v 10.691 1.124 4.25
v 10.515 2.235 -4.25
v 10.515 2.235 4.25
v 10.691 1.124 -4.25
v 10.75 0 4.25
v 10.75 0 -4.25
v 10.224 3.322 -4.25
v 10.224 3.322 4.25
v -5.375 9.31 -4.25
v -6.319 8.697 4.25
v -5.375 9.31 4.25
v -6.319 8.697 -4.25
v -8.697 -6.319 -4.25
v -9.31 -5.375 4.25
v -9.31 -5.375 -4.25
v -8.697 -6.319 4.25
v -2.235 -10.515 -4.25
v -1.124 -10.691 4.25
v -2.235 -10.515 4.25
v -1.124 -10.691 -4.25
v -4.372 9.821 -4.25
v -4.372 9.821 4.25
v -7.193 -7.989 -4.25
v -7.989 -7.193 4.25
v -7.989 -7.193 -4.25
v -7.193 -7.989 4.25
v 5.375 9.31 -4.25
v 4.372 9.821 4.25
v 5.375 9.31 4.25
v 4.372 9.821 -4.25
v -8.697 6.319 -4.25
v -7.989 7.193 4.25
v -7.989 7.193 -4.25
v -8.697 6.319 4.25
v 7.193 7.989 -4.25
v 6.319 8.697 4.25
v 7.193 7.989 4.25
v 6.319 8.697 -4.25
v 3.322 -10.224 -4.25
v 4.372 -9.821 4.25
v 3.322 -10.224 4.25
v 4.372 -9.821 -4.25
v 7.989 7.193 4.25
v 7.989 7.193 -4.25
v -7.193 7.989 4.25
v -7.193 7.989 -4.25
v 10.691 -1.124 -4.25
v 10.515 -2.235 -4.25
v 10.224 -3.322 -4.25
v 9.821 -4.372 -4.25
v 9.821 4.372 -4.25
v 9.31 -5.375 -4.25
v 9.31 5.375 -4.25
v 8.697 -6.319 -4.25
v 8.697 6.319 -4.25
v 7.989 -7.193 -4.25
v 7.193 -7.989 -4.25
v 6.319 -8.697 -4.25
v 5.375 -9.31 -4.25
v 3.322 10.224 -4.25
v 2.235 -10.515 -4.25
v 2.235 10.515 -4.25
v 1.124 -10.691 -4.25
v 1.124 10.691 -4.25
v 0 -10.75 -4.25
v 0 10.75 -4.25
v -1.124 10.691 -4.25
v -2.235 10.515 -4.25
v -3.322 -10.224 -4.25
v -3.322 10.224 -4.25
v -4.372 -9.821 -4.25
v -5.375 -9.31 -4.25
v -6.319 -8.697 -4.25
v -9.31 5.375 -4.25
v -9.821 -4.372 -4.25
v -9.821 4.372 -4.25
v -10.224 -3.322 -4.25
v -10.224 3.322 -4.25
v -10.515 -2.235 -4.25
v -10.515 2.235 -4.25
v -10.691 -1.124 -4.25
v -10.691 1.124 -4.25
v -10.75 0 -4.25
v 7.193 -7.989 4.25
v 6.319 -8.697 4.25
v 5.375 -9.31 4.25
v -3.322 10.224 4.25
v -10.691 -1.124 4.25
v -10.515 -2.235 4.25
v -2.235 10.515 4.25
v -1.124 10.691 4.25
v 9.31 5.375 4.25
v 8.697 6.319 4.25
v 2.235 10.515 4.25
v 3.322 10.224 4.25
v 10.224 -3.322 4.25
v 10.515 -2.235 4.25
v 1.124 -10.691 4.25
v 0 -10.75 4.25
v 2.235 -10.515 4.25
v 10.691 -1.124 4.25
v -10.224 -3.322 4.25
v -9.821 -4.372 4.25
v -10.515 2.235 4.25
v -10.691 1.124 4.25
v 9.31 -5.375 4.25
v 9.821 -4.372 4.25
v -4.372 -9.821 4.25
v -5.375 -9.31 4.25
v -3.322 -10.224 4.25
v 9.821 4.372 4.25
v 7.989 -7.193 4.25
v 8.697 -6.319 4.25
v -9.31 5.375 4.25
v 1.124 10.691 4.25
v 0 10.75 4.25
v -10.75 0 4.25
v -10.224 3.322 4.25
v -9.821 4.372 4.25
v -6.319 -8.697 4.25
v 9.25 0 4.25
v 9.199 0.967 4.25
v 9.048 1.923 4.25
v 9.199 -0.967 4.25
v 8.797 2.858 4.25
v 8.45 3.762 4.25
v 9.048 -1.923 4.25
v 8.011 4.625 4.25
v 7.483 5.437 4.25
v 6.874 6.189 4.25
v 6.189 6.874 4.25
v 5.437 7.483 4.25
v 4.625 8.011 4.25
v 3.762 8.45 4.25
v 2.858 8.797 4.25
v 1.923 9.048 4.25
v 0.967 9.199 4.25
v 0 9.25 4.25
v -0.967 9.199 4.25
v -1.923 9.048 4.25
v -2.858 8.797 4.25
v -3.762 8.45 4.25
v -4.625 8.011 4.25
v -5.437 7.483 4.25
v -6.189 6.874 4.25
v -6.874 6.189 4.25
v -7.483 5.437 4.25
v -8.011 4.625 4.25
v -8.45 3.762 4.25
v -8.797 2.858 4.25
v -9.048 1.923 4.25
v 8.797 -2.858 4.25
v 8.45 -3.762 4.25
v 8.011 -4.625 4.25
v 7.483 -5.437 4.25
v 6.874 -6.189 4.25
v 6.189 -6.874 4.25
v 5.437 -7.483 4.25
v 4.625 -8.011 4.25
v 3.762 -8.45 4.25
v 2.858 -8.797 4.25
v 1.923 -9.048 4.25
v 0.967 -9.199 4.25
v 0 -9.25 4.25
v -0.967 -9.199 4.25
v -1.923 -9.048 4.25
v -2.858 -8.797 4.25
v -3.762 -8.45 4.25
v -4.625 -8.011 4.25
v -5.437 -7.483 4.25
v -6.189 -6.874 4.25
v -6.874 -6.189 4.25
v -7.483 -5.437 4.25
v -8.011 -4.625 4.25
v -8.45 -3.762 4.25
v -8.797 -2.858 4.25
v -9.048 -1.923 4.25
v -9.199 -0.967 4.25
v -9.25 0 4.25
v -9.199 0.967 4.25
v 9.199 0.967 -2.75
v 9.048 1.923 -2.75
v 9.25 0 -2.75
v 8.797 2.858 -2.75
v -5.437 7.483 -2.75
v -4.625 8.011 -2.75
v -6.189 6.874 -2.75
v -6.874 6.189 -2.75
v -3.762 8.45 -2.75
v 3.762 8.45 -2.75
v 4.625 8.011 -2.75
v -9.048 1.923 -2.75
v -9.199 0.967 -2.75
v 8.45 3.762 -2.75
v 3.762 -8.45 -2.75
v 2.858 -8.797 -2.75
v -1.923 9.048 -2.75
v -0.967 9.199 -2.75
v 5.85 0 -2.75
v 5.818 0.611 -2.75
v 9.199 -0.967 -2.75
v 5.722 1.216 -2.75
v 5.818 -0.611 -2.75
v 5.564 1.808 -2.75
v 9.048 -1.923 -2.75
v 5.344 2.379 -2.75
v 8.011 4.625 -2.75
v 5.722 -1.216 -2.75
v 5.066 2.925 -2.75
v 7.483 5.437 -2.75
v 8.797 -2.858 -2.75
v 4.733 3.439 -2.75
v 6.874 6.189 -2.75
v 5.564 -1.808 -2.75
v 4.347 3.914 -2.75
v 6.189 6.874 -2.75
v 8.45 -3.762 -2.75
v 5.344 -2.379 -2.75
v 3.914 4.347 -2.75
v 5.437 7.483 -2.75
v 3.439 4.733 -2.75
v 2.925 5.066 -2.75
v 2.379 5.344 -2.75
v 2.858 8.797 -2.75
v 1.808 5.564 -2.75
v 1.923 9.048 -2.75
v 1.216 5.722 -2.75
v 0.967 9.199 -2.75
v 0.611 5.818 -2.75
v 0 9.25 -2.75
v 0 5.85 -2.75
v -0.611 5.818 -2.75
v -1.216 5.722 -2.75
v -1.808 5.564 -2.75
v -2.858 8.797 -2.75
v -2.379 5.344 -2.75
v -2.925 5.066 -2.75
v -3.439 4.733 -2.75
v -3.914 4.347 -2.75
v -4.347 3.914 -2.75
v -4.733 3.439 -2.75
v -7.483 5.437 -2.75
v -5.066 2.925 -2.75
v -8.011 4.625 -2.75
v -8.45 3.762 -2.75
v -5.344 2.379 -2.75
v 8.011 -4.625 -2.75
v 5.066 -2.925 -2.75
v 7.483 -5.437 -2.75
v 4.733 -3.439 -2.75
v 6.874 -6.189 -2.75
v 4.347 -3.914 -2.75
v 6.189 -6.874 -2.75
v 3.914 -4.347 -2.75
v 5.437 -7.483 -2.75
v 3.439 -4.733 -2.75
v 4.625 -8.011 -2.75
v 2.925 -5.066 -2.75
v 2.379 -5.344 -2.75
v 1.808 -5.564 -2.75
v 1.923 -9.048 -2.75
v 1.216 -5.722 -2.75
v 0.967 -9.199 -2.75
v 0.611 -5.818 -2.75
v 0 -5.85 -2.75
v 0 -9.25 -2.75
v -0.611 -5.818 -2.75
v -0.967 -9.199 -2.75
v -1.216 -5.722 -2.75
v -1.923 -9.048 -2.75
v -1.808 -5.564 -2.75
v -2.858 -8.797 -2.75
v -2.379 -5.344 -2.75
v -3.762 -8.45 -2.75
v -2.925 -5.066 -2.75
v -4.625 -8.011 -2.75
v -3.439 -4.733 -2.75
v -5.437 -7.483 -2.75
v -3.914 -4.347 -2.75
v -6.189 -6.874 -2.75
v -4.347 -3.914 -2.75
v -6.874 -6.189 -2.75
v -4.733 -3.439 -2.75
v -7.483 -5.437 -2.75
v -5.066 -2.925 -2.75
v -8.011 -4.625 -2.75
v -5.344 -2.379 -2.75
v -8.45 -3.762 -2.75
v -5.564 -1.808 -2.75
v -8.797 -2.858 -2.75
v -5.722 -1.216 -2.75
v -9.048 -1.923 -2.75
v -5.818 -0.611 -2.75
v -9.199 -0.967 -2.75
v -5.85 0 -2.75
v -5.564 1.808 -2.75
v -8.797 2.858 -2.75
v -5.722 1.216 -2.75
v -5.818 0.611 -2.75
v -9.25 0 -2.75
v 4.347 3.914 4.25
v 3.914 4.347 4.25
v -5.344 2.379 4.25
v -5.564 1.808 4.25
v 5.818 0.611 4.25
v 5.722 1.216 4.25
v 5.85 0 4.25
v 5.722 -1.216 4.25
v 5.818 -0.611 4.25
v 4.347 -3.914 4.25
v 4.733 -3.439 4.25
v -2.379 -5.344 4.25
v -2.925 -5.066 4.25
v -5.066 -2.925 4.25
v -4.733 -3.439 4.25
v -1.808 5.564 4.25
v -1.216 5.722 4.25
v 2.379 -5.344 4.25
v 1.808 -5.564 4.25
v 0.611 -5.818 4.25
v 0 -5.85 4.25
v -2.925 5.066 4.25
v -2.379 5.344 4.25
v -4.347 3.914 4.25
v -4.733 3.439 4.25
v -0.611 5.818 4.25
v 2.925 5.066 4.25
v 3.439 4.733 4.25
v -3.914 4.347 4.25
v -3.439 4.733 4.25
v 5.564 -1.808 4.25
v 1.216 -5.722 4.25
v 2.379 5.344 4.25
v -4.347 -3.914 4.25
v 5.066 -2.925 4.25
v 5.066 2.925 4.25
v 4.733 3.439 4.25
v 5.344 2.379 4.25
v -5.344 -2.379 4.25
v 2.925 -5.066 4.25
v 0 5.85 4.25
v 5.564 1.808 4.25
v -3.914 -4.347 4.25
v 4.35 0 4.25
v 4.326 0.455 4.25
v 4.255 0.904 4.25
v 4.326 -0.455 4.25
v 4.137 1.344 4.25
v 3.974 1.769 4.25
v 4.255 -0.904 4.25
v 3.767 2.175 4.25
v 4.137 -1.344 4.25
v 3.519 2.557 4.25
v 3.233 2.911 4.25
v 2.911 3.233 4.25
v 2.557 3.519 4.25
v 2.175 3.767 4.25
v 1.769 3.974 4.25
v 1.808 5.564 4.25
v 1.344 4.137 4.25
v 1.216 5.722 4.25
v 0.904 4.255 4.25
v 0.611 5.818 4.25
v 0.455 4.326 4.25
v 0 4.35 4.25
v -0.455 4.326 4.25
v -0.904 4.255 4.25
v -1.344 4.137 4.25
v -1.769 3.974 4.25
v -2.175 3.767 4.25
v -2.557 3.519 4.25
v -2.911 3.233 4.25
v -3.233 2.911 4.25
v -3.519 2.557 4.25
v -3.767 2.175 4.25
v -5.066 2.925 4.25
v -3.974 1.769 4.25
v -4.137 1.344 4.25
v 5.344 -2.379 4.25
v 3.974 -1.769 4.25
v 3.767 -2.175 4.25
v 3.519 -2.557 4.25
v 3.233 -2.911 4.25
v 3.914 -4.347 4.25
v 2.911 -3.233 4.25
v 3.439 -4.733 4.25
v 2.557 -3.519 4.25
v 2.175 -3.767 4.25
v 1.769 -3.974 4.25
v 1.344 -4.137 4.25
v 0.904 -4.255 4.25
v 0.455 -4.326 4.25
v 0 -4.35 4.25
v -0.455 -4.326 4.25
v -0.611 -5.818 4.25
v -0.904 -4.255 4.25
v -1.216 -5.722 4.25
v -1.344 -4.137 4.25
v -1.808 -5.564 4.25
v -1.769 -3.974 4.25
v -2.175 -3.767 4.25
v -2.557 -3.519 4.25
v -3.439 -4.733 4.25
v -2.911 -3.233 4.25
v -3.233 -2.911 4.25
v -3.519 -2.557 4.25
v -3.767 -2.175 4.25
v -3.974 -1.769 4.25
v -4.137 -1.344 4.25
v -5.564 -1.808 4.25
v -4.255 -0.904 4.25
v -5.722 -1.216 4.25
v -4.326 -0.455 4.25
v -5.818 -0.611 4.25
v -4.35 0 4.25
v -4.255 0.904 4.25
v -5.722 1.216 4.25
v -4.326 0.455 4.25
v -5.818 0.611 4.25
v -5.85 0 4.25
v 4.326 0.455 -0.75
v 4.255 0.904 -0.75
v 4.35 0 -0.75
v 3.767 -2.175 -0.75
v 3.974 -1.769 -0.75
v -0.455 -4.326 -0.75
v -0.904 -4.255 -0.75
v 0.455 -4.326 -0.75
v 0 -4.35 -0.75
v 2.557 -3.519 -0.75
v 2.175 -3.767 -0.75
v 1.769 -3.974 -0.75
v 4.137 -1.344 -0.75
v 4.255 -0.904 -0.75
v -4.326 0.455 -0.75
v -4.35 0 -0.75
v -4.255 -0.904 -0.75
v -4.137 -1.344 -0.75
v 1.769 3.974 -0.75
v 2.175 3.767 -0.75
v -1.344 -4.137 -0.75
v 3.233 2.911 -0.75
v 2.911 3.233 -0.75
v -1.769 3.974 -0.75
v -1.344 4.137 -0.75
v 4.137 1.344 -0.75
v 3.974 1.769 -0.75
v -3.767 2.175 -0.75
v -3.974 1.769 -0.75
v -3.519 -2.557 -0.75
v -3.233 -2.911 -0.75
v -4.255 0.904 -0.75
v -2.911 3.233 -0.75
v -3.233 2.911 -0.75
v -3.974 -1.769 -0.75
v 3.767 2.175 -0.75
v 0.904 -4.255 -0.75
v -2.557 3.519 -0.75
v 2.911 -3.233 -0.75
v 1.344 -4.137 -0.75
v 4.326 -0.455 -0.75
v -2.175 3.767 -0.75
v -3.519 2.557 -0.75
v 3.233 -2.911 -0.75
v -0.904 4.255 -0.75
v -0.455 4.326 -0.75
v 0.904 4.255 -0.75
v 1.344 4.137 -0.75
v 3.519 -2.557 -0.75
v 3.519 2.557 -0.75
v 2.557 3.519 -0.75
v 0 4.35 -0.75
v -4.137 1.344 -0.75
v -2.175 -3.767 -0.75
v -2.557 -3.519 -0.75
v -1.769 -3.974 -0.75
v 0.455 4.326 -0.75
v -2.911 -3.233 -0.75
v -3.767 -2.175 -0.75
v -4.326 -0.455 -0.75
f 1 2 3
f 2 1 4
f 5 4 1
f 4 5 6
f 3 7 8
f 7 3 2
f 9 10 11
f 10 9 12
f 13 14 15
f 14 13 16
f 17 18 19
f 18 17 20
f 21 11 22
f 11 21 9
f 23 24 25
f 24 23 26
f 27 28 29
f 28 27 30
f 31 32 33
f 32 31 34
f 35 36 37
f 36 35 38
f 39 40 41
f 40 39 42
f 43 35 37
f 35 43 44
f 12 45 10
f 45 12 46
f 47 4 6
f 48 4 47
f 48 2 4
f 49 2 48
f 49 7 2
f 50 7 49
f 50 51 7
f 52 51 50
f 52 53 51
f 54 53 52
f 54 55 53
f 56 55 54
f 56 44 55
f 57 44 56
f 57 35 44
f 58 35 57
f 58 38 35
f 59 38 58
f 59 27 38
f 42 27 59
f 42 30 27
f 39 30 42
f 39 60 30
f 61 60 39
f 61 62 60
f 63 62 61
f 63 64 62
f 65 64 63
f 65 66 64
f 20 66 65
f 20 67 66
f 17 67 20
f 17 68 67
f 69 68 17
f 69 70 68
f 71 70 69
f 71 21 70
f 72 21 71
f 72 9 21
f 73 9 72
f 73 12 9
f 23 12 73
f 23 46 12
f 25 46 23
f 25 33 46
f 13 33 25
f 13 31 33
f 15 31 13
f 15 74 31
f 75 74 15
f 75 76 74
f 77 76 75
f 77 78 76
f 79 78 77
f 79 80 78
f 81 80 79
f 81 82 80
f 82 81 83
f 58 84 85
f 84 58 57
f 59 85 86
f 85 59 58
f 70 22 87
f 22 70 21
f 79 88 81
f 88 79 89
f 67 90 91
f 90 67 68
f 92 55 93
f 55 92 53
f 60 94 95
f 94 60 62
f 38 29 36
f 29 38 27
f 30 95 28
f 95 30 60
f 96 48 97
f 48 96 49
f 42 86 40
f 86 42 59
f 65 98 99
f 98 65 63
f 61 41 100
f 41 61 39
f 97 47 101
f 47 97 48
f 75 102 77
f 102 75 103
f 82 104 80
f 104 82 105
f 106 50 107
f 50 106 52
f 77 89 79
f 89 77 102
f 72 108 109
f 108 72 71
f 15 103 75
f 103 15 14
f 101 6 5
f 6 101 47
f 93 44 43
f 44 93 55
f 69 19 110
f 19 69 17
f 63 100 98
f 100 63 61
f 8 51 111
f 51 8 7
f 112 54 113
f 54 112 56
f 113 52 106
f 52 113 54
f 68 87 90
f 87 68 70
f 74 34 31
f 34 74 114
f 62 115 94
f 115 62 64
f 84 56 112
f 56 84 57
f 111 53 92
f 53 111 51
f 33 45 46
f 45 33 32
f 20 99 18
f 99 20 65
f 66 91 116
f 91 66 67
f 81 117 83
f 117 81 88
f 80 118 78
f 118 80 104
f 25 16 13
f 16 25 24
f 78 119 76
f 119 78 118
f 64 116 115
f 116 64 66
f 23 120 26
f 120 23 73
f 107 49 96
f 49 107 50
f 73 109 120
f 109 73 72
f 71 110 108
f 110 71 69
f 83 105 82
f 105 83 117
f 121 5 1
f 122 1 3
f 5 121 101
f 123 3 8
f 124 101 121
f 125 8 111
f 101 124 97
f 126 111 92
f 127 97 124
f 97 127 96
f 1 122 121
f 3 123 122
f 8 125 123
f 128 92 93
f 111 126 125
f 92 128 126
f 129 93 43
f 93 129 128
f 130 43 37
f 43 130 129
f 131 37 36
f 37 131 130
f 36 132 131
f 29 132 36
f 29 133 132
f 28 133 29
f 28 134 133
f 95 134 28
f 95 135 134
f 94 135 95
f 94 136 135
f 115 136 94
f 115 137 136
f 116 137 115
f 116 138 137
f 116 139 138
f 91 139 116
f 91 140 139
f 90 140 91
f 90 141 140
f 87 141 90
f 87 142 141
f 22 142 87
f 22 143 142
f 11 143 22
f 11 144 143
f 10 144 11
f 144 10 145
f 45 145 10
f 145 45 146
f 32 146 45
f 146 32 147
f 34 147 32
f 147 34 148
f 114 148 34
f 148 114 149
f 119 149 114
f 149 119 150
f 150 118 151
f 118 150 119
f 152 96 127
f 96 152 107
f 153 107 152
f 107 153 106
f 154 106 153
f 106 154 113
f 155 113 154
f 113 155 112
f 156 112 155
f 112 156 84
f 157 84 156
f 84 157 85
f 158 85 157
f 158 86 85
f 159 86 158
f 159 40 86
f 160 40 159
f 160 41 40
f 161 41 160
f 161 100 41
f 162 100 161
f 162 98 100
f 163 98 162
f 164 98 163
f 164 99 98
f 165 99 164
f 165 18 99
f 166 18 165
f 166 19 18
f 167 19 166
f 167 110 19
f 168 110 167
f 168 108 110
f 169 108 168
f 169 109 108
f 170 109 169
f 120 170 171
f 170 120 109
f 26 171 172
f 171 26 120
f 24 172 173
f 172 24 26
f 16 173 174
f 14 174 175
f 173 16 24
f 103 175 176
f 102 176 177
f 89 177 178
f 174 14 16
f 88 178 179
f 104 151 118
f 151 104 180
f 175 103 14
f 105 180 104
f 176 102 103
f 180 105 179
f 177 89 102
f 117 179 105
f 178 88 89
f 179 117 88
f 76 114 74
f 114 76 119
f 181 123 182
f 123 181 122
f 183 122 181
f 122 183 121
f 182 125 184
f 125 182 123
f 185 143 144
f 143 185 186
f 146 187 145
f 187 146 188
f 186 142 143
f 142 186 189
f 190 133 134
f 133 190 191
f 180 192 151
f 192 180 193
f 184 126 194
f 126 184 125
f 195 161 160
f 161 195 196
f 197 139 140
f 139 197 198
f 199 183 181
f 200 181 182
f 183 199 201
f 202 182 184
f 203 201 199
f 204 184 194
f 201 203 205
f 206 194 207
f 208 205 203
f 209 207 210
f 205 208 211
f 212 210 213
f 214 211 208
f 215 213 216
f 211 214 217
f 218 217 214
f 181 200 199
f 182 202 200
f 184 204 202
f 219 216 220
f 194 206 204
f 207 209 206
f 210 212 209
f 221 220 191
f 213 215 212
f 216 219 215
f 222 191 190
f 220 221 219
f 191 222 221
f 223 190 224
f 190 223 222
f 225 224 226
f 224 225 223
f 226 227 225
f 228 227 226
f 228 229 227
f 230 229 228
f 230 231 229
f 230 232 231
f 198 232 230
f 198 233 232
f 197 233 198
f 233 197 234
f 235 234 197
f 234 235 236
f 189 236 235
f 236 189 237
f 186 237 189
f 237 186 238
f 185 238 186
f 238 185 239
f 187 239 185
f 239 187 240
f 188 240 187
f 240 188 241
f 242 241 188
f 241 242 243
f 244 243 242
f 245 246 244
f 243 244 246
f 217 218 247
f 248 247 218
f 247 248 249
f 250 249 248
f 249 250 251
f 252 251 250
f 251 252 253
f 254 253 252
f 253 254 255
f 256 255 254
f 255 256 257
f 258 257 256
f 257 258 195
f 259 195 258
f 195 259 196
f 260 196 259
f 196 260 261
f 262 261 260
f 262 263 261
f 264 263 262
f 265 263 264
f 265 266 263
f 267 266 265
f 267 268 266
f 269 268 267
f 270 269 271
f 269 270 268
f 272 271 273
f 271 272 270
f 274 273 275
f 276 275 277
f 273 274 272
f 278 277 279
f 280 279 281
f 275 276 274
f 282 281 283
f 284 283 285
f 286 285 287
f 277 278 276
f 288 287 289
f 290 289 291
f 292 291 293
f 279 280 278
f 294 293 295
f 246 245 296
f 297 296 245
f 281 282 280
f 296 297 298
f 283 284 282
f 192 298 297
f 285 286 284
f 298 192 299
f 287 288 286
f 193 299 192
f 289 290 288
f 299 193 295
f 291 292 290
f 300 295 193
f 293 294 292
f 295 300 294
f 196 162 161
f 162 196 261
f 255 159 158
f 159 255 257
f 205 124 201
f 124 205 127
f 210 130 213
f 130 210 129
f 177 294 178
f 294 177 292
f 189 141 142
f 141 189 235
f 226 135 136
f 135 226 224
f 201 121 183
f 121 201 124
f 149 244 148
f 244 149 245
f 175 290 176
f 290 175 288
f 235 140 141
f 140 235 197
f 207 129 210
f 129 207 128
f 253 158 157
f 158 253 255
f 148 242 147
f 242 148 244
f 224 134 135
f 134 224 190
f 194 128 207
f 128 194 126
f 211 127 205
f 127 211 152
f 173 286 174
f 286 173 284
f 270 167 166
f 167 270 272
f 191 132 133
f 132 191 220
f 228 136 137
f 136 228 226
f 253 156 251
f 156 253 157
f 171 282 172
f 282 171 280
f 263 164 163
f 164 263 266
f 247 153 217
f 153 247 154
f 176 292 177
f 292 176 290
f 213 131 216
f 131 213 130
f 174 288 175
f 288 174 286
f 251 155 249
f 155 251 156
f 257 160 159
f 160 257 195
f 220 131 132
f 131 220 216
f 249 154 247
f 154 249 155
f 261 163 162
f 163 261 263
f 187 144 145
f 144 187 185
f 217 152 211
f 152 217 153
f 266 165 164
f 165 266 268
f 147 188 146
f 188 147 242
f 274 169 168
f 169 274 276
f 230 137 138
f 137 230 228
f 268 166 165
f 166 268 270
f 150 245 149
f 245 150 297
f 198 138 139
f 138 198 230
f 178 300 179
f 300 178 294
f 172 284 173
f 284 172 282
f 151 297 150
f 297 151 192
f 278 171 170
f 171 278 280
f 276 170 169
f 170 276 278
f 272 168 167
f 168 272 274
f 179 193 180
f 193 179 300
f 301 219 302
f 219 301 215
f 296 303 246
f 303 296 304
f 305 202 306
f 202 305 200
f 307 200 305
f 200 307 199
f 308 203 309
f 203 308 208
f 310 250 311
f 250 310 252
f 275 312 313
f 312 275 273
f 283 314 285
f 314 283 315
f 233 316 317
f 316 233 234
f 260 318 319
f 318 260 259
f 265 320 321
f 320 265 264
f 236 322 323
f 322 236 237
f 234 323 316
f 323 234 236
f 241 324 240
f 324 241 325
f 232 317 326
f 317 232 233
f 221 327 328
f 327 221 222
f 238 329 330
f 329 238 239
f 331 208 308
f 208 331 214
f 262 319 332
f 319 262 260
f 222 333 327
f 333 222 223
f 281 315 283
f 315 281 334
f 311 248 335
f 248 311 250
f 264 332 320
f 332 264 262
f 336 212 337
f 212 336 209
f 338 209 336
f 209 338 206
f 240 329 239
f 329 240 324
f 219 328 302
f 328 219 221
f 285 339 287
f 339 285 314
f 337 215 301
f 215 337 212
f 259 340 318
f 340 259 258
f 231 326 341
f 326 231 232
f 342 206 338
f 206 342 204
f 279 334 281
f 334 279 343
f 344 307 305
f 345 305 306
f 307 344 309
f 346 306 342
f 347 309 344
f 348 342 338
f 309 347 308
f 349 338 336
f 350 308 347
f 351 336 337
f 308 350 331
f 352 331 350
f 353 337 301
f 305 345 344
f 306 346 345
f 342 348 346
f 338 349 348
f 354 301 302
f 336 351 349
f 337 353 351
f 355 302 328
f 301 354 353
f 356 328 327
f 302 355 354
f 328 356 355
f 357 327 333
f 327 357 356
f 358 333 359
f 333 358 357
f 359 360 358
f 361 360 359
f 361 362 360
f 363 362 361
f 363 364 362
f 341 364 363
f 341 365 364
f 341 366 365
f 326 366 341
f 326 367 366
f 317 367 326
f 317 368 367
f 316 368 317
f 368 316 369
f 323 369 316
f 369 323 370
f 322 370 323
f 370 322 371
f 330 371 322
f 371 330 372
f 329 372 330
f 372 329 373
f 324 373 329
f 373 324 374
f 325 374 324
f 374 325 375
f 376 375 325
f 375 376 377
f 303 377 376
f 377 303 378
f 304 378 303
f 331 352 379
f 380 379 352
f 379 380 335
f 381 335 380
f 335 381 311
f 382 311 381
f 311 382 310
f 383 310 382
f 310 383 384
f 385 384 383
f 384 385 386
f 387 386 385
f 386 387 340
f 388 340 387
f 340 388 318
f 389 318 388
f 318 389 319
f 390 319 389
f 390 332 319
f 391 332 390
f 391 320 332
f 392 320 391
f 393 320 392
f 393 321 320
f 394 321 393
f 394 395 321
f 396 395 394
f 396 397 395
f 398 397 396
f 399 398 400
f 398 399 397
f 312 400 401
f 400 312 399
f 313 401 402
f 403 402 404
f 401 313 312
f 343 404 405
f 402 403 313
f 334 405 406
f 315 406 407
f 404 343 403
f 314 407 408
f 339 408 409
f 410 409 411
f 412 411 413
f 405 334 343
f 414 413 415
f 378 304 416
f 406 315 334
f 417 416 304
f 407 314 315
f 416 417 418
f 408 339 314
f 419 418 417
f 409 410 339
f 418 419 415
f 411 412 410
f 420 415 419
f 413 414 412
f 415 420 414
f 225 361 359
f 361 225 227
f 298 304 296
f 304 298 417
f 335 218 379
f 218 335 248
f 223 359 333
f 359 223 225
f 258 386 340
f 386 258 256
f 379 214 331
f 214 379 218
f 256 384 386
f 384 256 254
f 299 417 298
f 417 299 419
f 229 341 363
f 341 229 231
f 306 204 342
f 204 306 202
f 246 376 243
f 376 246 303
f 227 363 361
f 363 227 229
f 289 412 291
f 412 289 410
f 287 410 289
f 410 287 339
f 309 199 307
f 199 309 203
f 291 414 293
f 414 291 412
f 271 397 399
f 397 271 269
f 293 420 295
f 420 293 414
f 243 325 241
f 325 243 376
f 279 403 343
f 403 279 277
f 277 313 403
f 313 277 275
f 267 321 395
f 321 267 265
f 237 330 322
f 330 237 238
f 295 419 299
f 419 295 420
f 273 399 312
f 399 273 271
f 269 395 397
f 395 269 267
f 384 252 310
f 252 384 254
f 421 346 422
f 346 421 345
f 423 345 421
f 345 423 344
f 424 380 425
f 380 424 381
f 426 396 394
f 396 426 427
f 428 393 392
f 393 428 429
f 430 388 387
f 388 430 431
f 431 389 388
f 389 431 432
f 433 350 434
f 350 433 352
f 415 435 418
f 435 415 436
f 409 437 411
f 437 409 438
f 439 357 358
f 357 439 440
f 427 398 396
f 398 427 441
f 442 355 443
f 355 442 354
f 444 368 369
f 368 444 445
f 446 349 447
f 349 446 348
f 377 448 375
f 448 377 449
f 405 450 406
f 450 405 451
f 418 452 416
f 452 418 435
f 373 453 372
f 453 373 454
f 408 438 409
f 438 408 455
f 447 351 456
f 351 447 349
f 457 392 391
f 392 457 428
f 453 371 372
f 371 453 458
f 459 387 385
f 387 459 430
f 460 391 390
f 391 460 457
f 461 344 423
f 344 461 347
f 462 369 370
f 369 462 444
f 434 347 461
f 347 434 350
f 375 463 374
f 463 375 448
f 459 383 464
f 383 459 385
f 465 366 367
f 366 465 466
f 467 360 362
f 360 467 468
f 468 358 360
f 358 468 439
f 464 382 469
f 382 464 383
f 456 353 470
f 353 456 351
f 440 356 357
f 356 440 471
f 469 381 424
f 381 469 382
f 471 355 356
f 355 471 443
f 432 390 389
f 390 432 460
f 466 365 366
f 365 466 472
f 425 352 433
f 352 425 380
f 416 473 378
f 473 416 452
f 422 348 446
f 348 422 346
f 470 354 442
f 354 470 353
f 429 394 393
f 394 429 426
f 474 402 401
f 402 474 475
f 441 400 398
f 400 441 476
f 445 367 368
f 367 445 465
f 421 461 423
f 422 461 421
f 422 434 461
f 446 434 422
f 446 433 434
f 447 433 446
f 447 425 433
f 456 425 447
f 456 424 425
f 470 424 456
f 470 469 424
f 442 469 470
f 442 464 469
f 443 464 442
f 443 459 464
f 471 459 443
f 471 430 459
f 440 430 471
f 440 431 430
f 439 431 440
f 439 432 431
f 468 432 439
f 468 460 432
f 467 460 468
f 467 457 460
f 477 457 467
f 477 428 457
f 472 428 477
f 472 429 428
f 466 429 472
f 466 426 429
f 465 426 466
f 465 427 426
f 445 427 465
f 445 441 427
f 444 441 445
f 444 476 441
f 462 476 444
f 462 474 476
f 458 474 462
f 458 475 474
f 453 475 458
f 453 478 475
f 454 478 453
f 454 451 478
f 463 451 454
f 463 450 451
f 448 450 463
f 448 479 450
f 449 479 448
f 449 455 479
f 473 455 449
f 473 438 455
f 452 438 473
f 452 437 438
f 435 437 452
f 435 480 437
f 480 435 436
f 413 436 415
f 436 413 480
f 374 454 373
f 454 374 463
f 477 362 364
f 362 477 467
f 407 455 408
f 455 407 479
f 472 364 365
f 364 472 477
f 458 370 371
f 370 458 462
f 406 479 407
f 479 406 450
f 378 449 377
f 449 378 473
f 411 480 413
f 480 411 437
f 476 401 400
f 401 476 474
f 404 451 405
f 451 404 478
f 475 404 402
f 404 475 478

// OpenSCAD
// Radius of the bottle neck
bottlerad=9.25;
// The thick of the bottle border
border=3.4; 

// The printed thickness of the borders
thick=1.5; 
// How long the bottle will penetrate into the cap
depth=7; // [5:15]


// Extra value for the printed top of the cap
top=1.5;

// Examples

// Danacol Dia
//bottlerad=28.4/2;
//border=2.7;

// Naturhouse
//bottlerad=18.5/2;
//border=3.4;

// Rose wine
//bottlerad=28/2;
//border=6;

difference(){
cylinder(h=depth+top, r=bottlerad+thick, $fn=60, center=true);
translate([0,0,top]) cylinder(h=depth+top, r=bottlerad, $fn=60, center=true);    
}
difference(){
translate([0,0,0]) cylinder(h=depth+top, r=bottlerad-border, $fn=60, center=true);
translate([0,0,top+2]) cylinder(h=depth+top, r=bottlerad-border-thick, $fn=60, center=true);    
}
